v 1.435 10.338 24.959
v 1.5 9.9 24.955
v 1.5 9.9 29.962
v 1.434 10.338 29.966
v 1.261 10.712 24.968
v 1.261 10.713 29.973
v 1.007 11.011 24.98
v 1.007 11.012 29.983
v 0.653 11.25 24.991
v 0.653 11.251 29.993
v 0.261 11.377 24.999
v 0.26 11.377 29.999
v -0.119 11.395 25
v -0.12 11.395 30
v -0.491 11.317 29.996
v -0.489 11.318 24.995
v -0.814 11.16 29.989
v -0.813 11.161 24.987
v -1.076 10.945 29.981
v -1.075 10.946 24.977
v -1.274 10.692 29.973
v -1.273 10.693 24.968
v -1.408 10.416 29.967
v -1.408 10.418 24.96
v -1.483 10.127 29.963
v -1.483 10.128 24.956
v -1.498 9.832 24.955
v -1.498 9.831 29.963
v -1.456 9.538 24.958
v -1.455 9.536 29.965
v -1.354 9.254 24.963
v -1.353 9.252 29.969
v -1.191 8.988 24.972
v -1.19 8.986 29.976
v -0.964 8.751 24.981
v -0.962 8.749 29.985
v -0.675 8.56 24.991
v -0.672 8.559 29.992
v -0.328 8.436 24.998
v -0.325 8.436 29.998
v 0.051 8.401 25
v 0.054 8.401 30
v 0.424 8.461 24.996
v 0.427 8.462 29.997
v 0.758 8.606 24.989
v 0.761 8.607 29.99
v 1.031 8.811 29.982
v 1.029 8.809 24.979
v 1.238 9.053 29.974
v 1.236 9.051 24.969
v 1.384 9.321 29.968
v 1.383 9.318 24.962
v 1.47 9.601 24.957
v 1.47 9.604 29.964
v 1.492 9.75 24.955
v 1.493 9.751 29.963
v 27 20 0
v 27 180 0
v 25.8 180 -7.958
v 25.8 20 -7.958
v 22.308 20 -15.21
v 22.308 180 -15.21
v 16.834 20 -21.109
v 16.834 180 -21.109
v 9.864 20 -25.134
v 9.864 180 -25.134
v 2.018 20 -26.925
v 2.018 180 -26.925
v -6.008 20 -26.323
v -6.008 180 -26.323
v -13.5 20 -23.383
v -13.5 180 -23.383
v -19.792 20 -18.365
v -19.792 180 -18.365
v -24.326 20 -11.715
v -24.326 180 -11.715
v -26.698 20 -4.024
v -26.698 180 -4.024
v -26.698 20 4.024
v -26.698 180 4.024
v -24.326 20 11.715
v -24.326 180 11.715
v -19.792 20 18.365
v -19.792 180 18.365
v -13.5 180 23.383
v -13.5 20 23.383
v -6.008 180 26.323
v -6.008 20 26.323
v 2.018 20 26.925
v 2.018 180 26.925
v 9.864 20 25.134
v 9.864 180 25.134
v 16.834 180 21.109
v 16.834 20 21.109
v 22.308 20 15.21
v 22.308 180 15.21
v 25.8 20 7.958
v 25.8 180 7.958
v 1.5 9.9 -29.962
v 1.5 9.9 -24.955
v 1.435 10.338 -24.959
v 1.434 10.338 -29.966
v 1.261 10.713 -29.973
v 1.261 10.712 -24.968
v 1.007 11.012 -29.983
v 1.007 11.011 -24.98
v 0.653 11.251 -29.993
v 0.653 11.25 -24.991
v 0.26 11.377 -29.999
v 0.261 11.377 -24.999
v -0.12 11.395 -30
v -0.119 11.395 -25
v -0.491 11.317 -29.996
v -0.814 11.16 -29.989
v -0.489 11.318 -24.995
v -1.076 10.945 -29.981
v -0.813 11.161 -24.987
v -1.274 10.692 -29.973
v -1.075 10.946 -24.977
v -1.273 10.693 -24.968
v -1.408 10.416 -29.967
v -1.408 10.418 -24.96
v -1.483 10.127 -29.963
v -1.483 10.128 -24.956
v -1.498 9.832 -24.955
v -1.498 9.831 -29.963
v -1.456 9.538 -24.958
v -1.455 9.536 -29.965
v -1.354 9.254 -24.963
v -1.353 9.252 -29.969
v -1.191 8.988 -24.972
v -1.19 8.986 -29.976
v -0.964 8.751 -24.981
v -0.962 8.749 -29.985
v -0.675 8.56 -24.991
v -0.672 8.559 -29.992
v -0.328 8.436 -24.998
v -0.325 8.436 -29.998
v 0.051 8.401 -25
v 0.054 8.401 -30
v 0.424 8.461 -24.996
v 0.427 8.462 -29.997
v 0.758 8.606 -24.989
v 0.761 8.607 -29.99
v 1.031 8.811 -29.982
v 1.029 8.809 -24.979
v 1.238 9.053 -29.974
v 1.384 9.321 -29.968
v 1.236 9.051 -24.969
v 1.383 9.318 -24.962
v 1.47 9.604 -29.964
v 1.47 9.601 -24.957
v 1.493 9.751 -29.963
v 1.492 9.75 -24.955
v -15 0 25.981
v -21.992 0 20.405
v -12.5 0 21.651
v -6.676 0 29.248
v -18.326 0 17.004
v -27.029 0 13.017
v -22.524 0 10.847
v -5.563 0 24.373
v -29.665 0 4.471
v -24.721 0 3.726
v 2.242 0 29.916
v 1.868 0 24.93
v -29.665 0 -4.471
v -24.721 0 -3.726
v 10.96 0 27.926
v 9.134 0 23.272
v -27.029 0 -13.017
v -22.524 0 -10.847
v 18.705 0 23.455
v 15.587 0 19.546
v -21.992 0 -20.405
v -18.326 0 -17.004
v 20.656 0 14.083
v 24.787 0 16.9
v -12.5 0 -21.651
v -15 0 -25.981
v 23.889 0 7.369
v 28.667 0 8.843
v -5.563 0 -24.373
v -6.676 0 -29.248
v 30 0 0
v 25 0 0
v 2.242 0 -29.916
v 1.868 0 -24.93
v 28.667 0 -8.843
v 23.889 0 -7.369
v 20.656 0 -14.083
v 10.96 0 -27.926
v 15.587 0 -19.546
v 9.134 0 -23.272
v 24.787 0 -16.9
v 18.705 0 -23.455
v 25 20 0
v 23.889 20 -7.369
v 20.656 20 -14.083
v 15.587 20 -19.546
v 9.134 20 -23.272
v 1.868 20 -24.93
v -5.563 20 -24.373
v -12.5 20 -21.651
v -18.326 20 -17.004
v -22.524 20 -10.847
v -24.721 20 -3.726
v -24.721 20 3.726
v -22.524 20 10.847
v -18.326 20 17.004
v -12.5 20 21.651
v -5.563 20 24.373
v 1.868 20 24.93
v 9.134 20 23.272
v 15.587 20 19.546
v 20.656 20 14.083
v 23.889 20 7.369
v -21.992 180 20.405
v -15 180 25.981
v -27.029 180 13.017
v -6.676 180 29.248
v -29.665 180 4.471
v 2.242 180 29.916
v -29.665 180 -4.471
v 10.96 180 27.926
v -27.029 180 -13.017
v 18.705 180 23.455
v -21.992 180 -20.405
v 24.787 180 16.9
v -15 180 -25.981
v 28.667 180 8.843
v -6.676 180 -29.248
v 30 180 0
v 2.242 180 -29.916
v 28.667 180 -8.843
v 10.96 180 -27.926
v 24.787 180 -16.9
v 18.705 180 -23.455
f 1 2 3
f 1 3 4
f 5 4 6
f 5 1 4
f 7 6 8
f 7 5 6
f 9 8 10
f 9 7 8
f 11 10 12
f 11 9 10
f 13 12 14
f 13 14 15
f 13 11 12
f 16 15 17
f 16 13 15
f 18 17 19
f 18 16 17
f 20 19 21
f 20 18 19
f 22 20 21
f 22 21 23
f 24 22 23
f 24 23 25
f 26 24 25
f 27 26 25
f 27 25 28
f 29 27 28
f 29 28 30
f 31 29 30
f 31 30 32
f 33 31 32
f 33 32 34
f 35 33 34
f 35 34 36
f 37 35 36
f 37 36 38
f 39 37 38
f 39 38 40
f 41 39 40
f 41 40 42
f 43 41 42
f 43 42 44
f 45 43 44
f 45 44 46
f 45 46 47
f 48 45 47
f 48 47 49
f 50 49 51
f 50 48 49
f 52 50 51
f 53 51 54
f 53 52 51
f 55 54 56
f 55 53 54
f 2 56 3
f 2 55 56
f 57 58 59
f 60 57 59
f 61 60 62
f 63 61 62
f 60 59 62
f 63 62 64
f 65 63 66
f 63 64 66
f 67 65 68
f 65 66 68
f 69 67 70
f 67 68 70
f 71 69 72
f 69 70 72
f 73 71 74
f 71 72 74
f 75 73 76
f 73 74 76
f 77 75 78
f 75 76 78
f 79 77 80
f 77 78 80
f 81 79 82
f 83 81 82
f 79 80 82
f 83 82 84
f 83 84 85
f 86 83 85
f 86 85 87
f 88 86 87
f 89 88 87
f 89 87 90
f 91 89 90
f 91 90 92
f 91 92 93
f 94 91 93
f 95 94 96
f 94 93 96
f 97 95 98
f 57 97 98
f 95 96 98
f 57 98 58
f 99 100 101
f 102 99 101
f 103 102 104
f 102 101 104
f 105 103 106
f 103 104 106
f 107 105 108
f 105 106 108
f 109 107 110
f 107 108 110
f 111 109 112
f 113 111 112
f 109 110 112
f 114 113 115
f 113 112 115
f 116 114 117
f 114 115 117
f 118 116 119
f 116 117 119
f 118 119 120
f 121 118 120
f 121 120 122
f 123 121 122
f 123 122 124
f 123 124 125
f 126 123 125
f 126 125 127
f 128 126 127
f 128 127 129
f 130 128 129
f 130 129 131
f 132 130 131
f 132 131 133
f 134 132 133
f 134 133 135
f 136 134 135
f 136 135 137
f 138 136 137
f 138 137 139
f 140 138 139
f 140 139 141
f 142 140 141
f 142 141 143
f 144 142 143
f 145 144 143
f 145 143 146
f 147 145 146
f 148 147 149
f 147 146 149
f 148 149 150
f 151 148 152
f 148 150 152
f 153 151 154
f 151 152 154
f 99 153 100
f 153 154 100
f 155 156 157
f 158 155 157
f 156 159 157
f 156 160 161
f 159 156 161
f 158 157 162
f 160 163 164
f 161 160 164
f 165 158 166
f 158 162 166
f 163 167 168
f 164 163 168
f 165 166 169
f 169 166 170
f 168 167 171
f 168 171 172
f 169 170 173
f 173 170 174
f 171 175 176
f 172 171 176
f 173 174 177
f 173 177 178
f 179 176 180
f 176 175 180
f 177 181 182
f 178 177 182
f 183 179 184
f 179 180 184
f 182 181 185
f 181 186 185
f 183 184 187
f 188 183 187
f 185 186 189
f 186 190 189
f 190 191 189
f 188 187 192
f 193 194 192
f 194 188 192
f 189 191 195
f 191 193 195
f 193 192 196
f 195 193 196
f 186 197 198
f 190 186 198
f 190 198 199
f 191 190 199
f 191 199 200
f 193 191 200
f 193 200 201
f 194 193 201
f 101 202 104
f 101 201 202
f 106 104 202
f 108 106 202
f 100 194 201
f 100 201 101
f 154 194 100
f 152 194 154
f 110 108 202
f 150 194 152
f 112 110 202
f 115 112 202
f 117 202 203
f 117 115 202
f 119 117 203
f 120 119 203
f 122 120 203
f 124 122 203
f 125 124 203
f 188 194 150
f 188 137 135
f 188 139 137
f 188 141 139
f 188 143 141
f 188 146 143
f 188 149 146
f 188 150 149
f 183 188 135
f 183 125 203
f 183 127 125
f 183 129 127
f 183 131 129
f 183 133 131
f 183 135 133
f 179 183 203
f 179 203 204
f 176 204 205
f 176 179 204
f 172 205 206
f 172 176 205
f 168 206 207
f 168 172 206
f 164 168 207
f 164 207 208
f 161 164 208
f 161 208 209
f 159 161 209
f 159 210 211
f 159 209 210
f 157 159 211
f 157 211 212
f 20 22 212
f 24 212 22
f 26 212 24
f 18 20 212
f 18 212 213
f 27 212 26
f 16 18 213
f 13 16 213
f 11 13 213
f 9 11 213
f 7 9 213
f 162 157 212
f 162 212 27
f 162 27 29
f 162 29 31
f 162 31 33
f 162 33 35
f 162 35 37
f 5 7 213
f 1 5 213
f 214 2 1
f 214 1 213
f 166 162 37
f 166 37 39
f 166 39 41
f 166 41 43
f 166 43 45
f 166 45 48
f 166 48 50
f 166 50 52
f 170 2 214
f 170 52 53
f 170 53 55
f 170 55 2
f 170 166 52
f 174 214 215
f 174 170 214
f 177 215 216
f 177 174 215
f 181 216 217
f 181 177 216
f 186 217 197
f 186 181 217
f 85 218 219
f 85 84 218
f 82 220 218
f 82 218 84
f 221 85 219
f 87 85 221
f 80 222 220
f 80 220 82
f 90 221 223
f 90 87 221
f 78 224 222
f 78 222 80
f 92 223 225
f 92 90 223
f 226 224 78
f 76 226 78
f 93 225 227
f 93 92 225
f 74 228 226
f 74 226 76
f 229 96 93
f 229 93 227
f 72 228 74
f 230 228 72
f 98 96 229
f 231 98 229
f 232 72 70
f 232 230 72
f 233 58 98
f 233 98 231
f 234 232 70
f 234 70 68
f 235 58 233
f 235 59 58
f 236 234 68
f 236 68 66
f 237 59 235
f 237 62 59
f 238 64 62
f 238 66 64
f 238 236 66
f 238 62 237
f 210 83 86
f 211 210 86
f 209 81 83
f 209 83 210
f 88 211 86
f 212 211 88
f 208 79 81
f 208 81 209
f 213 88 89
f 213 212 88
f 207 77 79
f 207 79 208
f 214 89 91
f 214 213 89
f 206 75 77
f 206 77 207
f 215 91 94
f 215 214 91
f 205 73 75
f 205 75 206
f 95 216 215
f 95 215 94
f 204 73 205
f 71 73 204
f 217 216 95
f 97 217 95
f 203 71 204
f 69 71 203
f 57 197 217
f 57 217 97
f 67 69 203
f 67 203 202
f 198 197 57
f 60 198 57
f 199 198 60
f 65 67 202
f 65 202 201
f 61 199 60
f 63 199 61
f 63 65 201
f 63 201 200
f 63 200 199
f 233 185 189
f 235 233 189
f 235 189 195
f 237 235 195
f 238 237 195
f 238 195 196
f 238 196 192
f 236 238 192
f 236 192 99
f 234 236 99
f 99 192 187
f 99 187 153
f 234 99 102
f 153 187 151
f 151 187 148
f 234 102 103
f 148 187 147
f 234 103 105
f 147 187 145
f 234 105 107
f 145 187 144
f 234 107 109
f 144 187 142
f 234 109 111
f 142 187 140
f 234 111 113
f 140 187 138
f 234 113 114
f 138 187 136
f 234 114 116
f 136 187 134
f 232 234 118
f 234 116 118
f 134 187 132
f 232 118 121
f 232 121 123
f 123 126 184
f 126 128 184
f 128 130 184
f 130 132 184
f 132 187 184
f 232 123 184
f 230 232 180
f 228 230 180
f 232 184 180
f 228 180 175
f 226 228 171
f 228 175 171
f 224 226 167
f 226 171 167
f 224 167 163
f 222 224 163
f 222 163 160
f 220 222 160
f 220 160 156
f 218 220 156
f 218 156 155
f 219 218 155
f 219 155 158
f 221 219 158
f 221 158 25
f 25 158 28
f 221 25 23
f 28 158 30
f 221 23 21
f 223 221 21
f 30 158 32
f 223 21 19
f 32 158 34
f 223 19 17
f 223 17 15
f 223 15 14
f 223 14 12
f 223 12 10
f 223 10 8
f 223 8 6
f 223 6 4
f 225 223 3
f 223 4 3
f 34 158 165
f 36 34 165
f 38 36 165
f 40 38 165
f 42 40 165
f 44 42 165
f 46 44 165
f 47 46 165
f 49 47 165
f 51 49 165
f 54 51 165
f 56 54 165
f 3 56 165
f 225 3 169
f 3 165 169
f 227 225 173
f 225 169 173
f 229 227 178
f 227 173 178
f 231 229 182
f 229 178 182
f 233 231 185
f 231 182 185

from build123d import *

# Parameters (mm, degrees)
SKETCH1_R               = 30
SKETCH1_R_2             = 25
BOSS_EXTRUDE1_DEPTH     = 180
SKETCH2_R               = 1.5
CUT_EXTRUDE1_DEPTH      = 31
CUT_EXTRUDE1_DEPTH_BACK = 31
SKETCH3_R               = 27
SKETCH3_R_2             = 19.569844271
CUT_EXTRUDE2_DEPTH      = 160


with BuildPart() as part:
    # Sketch1 → Boss-Extrude1 (new body)
    with BuildSketch(Plane(origin=(0, 0, 0), x_dir=(1, 0, 0), z_dir=(0, 1, 0))):
        Circle(SKETCH1_R)
        Circle(SKETCH1_R_2, mode=Mode.SUBTRACT)
    extrude(amount=BOSS_EXTRUDE1_DEPTH)

    # Sketch2 → Cut-Extrude1 (cut, two sides)
    with BuildSketch(Plane.XY) as cut_extrude1_sk:
        with Locations((0, 9.9)):
            Circle(SKETCH2_R)
    extrude(amount=CUT_EXTRUDE1_DEPTH, mode=Mode.SUBTRACT)
    extrude(cut_extrude1_sk.sketch, amount=-CUT_EXTRUDE1_DEPTH_BACK, mode=Mode.SUBTRACT)

    # Sketch3 → Cut-Extrude2 (cut)
    with BuildSketch(Plane(origin=(0, 180, 0), x_dir=(1, 0, 0), z_dir=(0, 1, 0))):
        Circle(SKETCH3_R)
        Circle(SKETCH3_R_2, mode=Mode.SUBTRACT)
    extrude(amount=-CUT_EXTRUDE2_DEPTH, mode=Mode.SUBTRACT)


solid = part.part
